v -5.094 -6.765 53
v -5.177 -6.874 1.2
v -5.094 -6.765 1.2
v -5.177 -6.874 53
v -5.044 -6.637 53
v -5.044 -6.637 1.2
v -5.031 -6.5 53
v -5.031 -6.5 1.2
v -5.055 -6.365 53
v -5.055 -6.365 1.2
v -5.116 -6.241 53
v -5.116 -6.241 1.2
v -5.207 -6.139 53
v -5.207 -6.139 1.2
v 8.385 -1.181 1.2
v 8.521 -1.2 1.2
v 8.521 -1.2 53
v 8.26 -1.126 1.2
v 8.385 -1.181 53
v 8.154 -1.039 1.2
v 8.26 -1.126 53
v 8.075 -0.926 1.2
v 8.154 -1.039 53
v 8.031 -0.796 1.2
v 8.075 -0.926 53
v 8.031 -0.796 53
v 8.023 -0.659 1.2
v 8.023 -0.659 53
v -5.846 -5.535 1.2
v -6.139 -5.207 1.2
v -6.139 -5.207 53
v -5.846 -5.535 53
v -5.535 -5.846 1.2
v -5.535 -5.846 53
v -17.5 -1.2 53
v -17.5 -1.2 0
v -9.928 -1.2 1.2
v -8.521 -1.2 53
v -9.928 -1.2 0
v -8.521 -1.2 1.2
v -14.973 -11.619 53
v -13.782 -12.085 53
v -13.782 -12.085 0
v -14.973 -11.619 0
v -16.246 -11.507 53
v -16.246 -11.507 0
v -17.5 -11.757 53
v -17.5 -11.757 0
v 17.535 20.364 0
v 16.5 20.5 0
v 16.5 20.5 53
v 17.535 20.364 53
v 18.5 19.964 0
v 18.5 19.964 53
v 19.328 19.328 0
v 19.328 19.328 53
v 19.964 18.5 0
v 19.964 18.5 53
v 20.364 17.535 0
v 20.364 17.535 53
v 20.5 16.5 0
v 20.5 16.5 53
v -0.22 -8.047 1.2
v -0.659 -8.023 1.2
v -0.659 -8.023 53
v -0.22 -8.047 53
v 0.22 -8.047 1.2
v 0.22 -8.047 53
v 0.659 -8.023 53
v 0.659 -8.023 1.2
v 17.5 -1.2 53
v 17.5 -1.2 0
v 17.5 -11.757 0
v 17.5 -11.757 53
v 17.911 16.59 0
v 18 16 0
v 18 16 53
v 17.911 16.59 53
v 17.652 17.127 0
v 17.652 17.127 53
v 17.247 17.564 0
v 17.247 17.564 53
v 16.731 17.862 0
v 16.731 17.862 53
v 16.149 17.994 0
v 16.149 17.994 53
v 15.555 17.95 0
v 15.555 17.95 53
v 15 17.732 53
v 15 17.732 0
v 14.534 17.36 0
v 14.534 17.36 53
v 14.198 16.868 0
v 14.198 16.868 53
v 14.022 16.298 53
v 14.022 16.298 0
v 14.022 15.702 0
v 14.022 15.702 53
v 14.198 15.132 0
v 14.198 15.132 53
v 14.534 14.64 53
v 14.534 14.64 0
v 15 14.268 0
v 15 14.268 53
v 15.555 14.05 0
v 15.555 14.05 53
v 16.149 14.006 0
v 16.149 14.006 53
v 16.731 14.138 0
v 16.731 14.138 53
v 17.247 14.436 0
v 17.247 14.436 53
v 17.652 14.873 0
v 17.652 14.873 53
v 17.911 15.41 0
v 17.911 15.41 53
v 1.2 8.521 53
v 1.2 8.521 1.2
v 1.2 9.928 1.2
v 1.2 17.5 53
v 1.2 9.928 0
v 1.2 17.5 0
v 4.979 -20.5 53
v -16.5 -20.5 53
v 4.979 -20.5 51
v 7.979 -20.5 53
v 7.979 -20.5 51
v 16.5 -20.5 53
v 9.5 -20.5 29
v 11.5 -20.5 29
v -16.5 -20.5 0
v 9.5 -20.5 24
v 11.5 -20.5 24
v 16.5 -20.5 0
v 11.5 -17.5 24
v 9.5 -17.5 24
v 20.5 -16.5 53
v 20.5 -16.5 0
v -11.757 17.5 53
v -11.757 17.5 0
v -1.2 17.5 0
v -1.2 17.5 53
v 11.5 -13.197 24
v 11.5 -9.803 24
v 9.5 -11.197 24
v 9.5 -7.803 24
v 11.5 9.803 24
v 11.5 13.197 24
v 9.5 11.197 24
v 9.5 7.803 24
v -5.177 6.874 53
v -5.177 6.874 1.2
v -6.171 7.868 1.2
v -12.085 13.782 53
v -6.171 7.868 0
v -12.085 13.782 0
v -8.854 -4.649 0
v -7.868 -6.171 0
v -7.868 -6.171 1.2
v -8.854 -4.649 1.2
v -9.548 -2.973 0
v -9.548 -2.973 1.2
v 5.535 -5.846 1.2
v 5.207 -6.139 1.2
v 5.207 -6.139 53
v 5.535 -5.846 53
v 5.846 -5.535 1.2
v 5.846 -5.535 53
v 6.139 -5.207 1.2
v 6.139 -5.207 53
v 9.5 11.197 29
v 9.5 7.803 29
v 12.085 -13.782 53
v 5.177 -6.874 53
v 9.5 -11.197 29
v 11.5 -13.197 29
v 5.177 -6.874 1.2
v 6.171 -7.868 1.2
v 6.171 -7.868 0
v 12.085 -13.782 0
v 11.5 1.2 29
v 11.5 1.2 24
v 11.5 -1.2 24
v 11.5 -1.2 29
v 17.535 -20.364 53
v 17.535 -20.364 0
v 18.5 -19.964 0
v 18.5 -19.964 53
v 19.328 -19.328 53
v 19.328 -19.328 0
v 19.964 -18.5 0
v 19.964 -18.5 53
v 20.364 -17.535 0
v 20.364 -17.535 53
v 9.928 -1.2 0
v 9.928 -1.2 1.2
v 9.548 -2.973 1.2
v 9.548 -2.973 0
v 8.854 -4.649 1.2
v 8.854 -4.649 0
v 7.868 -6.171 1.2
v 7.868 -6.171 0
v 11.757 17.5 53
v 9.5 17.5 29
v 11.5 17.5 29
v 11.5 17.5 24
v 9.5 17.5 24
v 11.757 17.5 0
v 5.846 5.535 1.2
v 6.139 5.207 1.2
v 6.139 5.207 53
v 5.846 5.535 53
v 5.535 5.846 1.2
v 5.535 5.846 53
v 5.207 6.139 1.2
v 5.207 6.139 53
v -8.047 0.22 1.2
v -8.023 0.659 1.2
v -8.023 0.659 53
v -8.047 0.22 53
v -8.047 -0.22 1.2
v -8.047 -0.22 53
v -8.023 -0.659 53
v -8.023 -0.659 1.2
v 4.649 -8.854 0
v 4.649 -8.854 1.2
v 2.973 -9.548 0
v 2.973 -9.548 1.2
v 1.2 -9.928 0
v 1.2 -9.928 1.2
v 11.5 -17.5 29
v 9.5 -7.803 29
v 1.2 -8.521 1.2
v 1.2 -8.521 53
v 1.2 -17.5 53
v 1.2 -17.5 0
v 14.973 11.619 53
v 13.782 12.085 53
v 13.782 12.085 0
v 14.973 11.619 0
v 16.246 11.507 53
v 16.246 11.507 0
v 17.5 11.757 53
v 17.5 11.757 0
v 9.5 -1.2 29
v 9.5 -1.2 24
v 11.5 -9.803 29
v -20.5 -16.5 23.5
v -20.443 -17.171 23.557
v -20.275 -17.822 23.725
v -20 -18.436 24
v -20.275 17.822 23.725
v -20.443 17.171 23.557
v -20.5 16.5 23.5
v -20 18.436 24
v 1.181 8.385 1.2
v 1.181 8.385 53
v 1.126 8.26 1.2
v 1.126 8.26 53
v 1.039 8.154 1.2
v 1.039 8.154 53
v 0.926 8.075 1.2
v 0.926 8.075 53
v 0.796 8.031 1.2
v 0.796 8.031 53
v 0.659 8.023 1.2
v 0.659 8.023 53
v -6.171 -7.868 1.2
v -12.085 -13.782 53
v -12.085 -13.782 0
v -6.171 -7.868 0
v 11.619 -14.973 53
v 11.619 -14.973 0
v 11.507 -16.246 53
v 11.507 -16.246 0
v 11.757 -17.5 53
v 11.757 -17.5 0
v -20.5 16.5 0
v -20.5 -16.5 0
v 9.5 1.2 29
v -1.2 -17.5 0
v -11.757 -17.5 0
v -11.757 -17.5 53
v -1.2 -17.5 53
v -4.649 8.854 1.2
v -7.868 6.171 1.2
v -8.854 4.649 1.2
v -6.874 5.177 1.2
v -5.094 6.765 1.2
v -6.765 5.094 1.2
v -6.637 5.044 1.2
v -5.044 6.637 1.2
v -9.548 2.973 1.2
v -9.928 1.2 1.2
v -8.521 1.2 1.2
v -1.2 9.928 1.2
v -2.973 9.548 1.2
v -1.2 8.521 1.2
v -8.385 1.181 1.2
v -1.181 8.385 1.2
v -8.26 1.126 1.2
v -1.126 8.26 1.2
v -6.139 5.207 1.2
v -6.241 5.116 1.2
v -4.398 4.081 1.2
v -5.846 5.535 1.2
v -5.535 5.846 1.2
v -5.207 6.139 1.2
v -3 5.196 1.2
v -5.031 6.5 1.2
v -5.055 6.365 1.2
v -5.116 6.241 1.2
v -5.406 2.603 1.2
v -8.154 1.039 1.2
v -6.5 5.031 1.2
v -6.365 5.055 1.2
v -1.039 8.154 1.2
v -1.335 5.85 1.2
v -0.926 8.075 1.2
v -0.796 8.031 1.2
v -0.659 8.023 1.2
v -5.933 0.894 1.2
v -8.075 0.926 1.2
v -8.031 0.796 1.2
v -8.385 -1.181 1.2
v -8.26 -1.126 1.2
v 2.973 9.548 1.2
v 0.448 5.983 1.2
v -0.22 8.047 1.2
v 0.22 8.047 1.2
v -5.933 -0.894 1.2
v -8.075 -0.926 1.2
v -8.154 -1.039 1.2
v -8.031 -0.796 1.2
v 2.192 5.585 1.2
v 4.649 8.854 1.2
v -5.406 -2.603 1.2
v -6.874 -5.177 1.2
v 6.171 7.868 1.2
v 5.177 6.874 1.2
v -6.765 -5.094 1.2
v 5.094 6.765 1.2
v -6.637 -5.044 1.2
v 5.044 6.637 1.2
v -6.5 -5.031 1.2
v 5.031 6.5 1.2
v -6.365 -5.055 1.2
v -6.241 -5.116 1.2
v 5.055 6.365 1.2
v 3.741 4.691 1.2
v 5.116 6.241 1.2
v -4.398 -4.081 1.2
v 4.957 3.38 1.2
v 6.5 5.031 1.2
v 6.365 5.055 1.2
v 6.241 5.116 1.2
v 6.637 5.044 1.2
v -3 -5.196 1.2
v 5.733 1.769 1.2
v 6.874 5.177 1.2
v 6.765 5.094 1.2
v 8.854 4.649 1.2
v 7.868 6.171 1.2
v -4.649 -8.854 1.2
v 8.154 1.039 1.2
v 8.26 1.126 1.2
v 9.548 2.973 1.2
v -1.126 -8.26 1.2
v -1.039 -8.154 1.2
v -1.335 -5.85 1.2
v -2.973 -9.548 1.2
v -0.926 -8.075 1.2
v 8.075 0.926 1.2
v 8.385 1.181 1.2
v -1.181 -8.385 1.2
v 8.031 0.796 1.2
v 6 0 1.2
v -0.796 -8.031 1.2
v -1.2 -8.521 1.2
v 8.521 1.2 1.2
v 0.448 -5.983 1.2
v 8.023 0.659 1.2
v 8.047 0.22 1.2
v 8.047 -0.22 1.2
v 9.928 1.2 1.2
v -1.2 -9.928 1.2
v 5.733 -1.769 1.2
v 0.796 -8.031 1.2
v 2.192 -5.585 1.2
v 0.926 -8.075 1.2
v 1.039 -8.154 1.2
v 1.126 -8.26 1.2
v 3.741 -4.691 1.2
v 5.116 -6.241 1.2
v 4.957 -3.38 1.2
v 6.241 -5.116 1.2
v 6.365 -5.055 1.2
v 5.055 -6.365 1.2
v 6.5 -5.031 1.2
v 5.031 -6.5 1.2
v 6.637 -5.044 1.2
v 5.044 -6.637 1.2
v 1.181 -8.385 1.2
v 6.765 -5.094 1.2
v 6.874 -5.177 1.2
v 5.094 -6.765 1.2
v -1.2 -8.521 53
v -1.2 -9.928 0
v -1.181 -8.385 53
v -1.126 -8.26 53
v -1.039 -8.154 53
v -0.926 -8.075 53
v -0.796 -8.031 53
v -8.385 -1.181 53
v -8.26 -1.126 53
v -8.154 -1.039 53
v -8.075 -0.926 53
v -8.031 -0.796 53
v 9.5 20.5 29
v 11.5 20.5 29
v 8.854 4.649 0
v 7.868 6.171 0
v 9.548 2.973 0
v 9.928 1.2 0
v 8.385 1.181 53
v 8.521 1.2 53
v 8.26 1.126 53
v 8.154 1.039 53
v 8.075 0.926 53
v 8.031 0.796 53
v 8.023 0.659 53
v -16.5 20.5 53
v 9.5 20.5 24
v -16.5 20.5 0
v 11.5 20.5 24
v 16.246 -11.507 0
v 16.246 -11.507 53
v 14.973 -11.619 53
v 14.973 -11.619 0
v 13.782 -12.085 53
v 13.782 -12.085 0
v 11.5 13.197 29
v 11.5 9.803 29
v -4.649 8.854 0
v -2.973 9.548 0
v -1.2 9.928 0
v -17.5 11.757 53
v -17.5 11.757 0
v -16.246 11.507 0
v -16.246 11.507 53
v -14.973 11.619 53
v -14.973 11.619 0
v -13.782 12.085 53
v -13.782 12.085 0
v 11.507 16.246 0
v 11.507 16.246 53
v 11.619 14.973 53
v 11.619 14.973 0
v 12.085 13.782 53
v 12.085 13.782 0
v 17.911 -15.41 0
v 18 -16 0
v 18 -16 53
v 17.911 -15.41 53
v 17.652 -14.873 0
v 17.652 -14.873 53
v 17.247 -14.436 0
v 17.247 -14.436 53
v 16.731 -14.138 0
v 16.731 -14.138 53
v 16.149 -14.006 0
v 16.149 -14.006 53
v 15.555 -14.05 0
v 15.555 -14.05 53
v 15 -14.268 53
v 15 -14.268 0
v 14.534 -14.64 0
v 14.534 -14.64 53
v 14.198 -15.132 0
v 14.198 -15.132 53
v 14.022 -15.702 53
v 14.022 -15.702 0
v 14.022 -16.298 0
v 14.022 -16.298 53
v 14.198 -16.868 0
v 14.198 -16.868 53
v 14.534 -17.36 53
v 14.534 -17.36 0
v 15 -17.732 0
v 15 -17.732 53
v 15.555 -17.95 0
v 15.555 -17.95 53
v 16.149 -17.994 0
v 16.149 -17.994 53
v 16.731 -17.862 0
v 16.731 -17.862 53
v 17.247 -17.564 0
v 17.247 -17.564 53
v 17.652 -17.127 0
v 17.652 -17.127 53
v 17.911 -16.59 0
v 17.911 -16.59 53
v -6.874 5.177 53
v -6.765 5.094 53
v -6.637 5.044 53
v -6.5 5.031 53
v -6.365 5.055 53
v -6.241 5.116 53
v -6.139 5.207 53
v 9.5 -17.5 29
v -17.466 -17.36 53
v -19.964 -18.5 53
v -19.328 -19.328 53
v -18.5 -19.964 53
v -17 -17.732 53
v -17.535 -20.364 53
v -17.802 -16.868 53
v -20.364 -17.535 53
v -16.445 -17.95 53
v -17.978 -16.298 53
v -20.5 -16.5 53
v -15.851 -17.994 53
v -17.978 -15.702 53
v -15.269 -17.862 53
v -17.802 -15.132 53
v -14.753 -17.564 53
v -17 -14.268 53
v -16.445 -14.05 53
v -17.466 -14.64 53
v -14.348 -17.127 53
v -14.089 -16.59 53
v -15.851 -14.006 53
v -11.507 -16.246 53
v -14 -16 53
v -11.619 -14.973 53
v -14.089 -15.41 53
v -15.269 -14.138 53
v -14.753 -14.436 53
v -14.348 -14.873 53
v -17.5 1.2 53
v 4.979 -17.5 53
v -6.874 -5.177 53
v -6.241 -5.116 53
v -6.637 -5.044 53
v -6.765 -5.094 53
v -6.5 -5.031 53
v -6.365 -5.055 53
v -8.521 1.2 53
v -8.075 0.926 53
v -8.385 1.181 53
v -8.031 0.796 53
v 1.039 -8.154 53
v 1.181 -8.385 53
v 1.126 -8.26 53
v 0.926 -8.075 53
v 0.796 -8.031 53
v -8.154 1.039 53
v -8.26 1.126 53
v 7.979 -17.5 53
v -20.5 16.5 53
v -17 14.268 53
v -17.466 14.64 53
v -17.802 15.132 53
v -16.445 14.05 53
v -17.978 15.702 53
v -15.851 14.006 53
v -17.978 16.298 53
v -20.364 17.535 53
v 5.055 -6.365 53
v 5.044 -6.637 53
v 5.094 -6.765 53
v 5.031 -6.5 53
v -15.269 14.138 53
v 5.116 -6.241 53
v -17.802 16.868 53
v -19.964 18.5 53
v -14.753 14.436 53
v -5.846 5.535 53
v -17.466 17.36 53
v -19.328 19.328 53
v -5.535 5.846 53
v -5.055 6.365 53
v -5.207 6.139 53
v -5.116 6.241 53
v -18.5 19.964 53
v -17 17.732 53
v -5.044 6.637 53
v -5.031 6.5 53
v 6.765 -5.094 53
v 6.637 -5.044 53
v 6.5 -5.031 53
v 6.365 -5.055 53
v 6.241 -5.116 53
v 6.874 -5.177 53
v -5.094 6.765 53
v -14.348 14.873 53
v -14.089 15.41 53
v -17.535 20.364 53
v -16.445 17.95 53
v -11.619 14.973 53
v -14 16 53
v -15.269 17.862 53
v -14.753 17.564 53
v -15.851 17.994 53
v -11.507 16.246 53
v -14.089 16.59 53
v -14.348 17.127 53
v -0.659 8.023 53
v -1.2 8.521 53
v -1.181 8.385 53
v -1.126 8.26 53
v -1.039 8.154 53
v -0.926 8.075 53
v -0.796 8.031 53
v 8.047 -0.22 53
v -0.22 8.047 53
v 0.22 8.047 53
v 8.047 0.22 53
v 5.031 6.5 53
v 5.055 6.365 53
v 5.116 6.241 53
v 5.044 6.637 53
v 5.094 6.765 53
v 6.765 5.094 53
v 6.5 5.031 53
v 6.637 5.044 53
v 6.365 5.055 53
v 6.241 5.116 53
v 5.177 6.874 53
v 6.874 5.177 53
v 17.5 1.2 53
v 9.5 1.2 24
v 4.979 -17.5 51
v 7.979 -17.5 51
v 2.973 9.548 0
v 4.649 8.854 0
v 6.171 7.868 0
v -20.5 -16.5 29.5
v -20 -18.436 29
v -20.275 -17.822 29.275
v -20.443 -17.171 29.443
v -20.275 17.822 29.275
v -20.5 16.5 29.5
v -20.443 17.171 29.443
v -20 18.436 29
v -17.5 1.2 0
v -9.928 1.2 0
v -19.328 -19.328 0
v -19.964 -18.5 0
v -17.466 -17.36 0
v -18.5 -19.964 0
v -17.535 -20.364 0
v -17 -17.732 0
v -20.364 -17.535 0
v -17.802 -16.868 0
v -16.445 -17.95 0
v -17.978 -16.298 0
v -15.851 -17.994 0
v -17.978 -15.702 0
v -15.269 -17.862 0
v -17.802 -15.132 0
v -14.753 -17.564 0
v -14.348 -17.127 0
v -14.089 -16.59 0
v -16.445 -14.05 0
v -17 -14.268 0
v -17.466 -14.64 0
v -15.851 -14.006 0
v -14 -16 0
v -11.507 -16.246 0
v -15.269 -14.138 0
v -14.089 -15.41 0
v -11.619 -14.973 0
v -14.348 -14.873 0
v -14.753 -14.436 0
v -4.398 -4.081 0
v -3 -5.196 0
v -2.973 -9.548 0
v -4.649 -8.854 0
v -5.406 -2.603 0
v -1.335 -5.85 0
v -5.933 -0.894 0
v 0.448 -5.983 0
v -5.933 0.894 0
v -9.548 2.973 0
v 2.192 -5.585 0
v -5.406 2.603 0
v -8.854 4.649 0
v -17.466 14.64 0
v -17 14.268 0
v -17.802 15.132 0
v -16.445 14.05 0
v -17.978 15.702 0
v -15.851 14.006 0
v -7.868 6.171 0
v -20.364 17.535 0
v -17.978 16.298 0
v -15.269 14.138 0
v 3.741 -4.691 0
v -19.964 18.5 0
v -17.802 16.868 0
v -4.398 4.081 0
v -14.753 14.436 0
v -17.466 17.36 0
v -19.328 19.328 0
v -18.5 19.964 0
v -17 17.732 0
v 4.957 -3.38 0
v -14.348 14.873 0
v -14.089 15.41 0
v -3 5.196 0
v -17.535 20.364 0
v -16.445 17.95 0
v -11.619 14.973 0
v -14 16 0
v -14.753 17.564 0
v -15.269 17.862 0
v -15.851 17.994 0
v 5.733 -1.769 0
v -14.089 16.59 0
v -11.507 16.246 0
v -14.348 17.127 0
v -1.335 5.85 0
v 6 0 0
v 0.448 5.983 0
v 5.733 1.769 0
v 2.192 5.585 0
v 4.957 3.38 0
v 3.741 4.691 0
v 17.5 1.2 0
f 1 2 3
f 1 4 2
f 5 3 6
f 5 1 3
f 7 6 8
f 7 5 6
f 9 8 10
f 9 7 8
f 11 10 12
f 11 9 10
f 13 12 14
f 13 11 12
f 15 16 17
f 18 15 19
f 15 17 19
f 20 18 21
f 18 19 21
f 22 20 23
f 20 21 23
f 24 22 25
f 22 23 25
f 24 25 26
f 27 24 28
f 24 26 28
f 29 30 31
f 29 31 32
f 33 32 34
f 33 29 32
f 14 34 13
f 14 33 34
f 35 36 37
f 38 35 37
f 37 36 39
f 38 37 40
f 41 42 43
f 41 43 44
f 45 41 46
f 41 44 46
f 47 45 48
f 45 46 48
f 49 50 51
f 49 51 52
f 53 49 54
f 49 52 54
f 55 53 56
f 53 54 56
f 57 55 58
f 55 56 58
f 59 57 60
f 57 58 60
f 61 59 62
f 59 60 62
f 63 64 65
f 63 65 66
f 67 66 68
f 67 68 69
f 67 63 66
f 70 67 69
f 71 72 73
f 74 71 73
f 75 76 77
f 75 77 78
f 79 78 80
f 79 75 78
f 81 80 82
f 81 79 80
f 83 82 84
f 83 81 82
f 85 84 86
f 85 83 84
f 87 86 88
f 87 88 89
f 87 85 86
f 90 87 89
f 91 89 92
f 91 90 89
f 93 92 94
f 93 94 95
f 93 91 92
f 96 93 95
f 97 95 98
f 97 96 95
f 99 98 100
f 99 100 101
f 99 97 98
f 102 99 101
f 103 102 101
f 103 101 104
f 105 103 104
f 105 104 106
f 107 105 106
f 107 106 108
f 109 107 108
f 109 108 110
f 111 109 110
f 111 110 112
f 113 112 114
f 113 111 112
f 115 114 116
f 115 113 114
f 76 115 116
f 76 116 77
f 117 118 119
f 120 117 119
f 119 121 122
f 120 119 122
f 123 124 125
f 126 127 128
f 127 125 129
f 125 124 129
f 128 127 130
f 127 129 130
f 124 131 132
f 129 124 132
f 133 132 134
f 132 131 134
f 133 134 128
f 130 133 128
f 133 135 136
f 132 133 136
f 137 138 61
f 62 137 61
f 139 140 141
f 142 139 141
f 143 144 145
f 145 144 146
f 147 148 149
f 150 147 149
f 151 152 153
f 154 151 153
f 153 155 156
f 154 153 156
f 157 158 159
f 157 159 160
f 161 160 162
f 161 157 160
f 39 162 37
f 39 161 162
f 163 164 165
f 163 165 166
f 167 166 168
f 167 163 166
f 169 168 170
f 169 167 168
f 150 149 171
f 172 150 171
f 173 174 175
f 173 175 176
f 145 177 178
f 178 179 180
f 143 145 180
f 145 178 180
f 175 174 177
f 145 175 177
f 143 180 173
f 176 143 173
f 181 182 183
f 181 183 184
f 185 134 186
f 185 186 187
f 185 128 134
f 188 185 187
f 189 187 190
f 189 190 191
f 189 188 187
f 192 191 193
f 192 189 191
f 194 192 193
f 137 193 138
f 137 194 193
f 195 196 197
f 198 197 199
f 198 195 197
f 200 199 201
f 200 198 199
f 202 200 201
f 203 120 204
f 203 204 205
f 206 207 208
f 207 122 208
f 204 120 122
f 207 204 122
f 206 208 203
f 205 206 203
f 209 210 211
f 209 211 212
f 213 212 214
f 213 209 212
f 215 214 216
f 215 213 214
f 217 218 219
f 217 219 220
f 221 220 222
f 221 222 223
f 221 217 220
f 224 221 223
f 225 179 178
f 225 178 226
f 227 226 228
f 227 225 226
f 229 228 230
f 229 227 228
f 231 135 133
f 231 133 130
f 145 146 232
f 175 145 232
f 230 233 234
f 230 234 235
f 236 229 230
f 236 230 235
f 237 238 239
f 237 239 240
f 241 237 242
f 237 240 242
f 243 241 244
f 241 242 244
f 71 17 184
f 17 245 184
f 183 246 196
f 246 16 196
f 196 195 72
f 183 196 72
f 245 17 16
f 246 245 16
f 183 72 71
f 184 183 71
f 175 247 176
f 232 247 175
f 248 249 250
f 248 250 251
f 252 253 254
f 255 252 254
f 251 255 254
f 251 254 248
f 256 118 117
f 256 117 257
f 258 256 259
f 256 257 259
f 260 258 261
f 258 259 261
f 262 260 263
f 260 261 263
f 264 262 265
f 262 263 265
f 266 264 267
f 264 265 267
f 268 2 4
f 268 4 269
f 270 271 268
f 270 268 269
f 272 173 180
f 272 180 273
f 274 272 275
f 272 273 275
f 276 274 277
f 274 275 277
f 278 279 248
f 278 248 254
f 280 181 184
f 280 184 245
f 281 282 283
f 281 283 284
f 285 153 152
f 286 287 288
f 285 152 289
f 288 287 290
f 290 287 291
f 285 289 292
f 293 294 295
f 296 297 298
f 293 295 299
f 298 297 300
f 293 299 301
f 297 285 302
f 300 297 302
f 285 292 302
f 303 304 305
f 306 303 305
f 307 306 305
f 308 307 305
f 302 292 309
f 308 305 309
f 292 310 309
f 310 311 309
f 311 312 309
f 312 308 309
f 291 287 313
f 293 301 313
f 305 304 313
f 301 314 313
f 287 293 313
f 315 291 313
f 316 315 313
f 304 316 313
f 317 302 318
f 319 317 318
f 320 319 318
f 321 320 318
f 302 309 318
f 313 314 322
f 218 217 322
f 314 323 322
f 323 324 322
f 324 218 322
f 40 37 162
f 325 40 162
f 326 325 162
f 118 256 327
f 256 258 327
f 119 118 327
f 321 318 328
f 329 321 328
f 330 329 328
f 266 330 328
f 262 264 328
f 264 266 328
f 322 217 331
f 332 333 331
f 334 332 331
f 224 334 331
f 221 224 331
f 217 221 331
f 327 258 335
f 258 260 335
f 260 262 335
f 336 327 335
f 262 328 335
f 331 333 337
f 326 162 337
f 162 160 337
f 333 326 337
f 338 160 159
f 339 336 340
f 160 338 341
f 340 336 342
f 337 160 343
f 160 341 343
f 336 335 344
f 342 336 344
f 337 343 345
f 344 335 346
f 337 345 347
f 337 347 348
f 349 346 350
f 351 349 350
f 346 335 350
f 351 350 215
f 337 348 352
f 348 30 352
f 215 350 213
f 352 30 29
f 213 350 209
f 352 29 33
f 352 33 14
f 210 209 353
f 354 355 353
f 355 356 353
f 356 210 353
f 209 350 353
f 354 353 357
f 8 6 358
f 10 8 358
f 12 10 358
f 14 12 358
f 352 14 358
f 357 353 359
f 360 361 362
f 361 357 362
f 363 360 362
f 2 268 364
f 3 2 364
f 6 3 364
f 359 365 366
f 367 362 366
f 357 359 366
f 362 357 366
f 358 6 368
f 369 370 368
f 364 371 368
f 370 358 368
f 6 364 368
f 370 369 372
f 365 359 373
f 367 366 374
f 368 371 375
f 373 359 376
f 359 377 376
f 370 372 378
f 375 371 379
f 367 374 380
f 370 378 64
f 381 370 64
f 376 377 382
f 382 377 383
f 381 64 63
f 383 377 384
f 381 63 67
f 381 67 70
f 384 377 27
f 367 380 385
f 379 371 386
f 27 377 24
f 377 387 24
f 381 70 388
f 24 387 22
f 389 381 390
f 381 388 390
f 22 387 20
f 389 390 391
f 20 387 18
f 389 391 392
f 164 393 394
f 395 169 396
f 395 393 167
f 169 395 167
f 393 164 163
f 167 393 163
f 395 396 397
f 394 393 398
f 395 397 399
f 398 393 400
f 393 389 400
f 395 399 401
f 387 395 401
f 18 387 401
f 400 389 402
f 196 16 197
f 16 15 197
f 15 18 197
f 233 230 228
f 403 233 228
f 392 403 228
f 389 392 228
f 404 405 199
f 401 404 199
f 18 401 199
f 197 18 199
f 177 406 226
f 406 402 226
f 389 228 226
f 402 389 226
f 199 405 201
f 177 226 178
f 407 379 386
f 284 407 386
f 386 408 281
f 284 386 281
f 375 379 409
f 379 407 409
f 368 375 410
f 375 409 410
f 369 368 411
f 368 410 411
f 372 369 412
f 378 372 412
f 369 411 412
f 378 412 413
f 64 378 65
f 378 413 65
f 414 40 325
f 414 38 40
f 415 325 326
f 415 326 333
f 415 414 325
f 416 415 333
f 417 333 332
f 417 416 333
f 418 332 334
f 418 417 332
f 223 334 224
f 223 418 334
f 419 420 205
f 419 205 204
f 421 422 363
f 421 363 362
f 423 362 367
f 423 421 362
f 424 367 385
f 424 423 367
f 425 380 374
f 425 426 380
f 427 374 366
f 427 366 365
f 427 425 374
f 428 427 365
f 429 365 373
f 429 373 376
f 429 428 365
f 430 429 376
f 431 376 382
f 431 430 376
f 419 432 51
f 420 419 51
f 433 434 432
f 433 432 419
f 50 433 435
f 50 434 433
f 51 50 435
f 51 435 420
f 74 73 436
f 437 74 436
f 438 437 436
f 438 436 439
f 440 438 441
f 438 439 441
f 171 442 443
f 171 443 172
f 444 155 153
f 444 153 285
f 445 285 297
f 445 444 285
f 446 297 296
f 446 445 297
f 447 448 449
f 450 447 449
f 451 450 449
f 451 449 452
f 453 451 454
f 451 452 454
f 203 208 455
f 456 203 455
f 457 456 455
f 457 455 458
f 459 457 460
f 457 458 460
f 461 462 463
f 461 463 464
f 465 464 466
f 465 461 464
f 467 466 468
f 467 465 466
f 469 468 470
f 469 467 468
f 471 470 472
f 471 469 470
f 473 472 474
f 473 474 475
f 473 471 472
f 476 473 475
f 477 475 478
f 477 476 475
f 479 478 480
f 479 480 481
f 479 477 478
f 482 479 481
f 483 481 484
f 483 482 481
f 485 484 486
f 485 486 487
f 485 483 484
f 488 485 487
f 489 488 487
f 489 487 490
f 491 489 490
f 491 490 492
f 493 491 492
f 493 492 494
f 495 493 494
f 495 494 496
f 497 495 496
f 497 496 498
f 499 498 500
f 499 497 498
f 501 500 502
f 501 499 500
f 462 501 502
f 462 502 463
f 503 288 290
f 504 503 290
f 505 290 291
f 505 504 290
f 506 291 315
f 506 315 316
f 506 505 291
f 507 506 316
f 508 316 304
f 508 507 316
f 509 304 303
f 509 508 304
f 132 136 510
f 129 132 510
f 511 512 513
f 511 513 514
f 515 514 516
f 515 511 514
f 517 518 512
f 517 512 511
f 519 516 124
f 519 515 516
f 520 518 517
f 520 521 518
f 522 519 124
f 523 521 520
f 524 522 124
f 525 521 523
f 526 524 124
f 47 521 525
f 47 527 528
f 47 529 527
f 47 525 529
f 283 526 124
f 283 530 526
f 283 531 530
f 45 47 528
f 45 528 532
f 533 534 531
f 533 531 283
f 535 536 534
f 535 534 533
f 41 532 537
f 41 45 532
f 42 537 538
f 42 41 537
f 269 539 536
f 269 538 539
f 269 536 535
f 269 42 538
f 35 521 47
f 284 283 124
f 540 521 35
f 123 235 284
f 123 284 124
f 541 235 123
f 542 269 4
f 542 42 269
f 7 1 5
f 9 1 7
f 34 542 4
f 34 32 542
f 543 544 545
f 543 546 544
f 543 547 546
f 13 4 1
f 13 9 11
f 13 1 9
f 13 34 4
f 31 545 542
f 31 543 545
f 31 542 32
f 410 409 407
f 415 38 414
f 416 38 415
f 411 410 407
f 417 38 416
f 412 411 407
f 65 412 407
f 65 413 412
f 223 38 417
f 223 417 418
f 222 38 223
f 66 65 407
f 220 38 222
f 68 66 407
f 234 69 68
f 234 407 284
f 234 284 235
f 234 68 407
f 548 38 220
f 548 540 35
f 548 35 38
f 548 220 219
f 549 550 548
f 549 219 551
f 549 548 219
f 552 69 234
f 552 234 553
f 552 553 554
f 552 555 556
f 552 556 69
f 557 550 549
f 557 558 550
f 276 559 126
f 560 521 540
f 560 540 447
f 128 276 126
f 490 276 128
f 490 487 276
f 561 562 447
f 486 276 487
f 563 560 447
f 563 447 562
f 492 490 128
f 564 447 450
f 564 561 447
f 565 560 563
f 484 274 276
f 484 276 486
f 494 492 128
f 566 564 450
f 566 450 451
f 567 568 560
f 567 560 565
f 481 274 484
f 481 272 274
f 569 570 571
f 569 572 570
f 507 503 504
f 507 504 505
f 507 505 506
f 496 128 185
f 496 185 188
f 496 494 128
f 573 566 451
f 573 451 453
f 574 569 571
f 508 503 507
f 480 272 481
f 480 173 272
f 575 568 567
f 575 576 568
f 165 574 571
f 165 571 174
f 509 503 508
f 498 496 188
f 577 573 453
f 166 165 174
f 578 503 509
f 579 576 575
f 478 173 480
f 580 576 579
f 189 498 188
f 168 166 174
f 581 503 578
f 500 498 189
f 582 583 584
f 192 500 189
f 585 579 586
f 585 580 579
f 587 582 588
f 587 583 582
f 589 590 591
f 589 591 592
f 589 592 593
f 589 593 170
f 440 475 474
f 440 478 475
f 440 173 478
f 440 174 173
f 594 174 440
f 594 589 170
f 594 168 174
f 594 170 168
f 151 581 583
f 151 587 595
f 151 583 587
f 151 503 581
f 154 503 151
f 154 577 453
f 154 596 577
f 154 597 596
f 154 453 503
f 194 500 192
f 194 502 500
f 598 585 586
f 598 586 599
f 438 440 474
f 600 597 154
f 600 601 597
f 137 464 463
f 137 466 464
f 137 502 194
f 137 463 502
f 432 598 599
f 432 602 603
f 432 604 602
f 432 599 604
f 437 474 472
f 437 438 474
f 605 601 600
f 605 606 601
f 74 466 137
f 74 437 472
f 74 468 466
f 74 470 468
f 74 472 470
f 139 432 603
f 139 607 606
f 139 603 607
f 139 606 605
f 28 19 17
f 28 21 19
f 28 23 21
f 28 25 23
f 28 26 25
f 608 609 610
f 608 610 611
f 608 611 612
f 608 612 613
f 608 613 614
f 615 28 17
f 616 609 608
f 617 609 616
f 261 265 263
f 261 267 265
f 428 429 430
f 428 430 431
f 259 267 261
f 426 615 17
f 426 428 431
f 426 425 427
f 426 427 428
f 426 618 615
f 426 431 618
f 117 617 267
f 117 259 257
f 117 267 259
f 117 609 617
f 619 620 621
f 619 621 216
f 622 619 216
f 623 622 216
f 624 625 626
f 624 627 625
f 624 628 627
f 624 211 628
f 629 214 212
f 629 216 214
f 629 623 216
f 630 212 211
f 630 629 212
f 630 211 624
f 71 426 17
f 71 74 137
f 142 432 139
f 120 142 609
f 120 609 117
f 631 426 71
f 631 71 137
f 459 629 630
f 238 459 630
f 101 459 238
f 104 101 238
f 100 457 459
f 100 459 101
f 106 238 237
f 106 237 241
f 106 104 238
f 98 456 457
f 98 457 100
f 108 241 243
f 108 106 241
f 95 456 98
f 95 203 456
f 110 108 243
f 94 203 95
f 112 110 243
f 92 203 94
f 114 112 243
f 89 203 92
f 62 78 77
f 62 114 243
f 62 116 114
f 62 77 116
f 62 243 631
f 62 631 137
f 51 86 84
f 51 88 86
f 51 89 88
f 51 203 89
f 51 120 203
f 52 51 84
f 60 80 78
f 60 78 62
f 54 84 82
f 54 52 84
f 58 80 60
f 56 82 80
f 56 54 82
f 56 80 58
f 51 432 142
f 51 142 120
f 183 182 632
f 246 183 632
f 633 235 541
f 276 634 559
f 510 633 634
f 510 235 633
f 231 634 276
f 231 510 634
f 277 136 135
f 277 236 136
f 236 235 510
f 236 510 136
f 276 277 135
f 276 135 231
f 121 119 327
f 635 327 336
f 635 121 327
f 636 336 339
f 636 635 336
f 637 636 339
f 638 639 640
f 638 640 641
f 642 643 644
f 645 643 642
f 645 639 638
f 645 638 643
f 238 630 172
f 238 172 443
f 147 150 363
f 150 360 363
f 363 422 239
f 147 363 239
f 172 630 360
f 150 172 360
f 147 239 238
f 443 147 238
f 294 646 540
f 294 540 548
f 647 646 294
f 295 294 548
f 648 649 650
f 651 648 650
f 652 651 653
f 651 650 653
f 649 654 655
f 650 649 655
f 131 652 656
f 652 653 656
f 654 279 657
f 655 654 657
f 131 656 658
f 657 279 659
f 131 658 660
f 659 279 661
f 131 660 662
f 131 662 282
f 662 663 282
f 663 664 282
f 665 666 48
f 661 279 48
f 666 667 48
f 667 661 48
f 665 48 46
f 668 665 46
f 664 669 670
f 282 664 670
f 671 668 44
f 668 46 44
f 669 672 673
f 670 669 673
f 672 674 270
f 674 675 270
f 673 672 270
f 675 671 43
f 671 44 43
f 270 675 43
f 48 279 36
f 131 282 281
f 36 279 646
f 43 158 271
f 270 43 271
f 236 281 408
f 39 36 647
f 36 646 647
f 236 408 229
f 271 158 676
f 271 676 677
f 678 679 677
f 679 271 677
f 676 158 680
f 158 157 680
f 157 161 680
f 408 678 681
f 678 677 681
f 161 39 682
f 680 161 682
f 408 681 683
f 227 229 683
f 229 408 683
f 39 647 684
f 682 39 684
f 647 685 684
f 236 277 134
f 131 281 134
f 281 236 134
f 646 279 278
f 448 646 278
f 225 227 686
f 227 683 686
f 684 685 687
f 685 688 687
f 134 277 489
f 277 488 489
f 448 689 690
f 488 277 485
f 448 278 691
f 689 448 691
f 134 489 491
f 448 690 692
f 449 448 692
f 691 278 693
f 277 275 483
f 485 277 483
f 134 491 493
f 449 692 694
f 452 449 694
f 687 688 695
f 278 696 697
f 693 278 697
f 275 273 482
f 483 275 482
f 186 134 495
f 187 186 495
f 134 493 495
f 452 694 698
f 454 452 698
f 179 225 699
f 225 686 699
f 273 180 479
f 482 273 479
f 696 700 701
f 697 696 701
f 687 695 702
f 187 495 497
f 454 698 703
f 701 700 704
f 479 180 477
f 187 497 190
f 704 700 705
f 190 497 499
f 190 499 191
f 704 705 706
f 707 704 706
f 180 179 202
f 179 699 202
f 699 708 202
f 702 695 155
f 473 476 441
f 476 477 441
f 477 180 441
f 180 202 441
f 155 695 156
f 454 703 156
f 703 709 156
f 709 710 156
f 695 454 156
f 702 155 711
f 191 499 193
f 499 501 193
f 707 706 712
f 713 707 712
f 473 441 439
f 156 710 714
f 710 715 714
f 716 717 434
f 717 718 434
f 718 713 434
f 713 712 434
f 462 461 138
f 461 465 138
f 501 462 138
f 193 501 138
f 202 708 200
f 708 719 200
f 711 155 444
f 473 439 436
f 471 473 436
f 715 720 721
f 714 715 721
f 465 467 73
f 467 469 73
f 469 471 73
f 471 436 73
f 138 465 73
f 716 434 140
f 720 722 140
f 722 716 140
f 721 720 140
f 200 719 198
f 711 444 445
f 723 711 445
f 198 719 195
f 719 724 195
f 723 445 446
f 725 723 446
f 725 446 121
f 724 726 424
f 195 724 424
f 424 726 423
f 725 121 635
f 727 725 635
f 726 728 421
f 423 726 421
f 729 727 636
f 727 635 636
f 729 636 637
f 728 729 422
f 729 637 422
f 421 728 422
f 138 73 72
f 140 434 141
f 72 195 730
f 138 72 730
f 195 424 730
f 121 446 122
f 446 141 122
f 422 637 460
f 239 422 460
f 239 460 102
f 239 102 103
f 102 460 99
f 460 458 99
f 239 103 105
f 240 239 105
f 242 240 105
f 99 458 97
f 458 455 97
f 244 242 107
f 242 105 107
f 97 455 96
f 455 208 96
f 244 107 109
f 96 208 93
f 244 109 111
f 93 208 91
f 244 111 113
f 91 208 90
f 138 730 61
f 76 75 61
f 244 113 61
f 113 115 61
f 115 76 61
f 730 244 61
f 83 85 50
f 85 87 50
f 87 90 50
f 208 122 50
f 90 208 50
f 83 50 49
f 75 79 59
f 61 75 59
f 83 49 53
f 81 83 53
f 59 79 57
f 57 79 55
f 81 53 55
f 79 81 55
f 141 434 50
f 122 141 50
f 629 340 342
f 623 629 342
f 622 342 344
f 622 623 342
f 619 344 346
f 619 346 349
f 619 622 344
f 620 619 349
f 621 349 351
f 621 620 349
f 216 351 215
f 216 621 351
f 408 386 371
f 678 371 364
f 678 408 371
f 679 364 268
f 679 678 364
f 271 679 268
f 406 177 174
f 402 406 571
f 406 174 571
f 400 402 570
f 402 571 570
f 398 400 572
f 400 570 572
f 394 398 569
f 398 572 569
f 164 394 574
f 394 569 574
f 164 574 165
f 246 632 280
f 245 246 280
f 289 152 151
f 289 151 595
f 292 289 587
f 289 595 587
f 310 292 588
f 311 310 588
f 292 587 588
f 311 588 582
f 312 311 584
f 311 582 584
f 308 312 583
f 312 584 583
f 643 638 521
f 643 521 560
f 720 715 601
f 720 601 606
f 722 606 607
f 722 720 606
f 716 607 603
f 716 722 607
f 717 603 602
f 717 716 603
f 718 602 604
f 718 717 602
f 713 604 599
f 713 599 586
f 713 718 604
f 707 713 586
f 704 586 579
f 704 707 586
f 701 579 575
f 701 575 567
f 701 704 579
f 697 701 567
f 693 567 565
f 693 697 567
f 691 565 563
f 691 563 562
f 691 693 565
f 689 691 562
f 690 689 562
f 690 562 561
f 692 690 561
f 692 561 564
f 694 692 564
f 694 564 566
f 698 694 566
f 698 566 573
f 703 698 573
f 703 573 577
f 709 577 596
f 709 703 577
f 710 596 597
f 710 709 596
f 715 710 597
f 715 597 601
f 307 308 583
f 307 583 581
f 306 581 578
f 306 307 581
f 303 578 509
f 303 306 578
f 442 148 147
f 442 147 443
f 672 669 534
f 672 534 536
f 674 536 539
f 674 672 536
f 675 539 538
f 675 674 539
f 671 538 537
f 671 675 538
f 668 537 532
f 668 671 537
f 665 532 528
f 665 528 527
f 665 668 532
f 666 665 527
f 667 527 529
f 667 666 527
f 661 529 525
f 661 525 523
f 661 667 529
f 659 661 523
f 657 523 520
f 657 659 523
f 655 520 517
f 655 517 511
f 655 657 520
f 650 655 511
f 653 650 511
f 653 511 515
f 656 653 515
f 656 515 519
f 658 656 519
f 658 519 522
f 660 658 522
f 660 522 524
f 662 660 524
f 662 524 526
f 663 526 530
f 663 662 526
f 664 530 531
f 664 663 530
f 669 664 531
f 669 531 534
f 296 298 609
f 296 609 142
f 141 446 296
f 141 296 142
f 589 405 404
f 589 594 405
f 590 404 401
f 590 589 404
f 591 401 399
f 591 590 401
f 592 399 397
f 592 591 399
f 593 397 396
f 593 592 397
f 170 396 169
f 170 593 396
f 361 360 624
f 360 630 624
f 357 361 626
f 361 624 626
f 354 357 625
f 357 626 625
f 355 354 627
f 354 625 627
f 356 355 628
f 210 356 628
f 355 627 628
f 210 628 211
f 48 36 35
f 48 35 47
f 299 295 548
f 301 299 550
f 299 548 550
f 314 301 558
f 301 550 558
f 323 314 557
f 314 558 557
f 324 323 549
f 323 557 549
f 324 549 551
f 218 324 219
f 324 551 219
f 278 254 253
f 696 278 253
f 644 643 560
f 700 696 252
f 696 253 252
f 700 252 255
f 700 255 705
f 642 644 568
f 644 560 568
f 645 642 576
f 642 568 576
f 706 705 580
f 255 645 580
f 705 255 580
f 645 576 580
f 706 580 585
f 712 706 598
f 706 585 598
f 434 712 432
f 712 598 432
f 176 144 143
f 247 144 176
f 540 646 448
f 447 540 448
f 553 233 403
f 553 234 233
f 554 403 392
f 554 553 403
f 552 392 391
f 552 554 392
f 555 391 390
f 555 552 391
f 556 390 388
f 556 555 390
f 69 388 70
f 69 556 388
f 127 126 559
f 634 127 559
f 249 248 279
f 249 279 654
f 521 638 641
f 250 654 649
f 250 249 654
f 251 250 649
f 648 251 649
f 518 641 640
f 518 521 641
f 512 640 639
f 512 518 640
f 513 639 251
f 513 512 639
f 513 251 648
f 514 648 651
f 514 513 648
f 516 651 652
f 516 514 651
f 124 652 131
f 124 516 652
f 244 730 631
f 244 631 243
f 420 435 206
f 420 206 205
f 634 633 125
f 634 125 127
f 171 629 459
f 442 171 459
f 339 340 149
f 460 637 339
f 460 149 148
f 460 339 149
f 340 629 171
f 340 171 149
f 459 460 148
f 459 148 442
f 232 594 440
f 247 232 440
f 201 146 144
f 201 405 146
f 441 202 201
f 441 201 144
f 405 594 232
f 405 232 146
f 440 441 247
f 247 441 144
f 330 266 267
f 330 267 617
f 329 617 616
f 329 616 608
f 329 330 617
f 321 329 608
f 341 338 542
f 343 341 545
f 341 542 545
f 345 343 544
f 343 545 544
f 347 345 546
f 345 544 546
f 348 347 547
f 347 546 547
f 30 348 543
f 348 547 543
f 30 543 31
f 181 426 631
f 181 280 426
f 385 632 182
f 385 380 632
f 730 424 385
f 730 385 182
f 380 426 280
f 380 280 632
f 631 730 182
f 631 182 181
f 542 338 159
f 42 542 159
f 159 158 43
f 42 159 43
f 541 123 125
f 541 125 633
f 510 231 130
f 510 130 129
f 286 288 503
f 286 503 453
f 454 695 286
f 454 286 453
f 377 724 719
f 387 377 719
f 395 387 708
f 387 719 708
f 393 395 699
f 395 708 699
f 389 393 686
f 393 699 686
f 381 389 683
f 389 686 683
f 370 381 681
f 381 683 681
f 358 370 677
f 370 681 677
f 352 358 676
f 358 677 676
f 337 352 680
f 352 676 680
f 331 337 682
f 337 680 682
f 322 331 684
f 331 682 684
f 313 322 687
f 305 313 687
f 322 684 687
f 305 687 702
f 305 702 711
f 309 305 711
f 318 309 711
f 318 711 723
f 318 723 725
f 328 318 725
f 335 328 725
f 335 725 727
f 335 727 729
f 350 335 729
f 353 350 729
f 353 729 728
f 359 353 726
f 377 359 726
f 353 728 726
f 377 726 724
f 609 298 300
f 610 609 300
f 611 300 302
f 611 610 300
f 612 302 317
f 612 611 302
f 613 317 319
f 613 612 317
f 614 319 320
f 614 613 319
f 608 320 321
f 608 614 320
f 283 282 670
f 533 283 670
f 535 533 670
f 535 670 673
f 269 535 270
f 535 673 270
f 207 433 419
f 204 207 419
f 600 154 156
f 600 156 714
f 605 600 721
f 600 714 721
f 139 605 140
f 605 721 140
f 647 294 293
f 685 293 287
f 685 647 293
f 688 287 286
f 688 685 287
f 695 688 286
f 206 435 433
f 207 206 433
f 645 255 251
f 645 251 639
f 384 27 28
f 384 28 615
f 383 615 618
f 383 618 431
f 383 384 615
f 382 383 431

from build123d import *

# Parameters (mm, degrees)
SKETCH_W        = 41
SKETCH_H        = 41
SKETCH_R        = 2
PAD_DEPTH       = 53
SKETCH001_R     = 10
SKETCH001_R_2   = 6
PAD001_DEPTH    = 1.2
FILLET_R        = 0.5
FILLET001_R     = 4
SKETCH002_W     = 3
SKETCH002_H     = 3
POCKET_DEPTH    = 2
SKETCH003_W     = 2
SKETCH003_H     = 5
POCKET001_DEPTH = 41.001
POCKET002_DEPTH = 41.001


with BuildPart() as part:
    # Sketch → Pad (new body)
    with BuildSketch(Plane.XY):
        Rectangle(SKETCH_W, SKETCH_H)
        with Locations((-16, 16)):
            Circle(SKETCH_R, mode=Mode.SUBTRACT)
        with Locations((16, 16)):
            Circle(SKETCH_R, mode=Mode.SUBTRACT)
        with Locations((-16, -16)):
            Circle(SKETCH_R, mode=Mode.SUBTRACT)
        with Locations((16, -16)):
            Circle(SKETCH_R, mode=Mode.SUBTRACT)
        with BuildLine():
            Line((-17.5, 1.2), (-7.960057, 1.2))
            ThreePointArc((-7.960057, 1.2), (-8.05, 0), (-7.960057, -1.2))
            Line((-17.5, -1.2), (-7.960057, -1.2))
            Line((-17.5, -1.2), (-17.5, -11.757359))
            ThreePointArc((-13.781771, -12.084715), (-15.605344, -11.517339), (-17.5, -11.757359))
            Line((-6.477138, -4.780082), (-13.781771, -12.084715))
            ThreePointArc((-6.477138, -4.780082), (-5.69221, -5.69221), (-4.780082, -6.477138))
            Line((-4.780082, -6.477138), (-12.084715, -13.781771))
            ThreePointArc((-11.757359, -17.5), (-11.517339, -15.605344), (-12.084715, -13.781771))
            Line((-11.757359, -17.5), (-1.2, -17.5))
            Line((-1.2, -7.960057), (-1.2, -17.5))
            ThreePointArc((-1.2, -7.960057), (0, -8.05), (1.2, -7.960057))
            Line((1.2, -7.960057), (1.2, -17.5))
            Line((1.2, -17.5), (11.757359, -17.5))
            ThreePointArc((12.084715, -13.781771), (11.517339, -15.605344), (11.757359, -17.5))
            Line((4.780082, -6.477138), (12.084715, -13.781771))
            ThreePointArc((4.780082, -6.477138), (5.69221, -5.69221), (6.477138, -4.780082))
            Line((6.477138, -4.780082), (13.781771, -12.084715))
            ThreePointArc((17.5, -11.757359), (15.605344, -11.517339), (13.781771, -12.084715))
            Line((17.5, -1.2), (17.5, -11.757359))
            Line((7.960057, -1.2), (17.5, -1.2))
            ThreePointArc((7.960057, -1.2), (8.05, 0), (7.960057, 1.2))
            Line((7.960057, 1.2), (17.5, 1.2))
            Line((17.5, 1.2), (17.5, 11.757359))
            ThreePointArc((13.781771, 12.084715), (15.605344, 11.517339), (17.5, 11.757359))
            Line((6.477138, 4.780082), (13.781771, 12.084715))
            ThreePointArc((6.477138, 4.780082), (5.69221, 5.69221), (4.780082, 6.477138))
            Line((4.780082, 6.477138), (12.084715, 13.781771))
            ThreePointArc((11.757359, 17.5), (11.517339, 15.605344), (12.084715, 13.781771))
            Line((1.2, 17.5), (11.757359, 17.5))
            Line((1.2, 7.960057), (1.2, 17.5))
            ThreePointArc((1.2, 7.960057), (0, 8.05), (-1.2, 7.960057))
            Line((-1.2, 7.960057), (-1.2, 17.5))
            Line((-11.757359, 17.5), (-1.2, 17.5))
            ThreePointArc((-12.084715, 13.781771), (-11.517339, 15.605344), (-11.757359, 17.5))
            Line((-4.780082, 6.477138), (-12.084715, 13.781771))
            ThreePointArc((-4.780082, 6.477138), (-5.69221, 5.69221), (-6.477138, 4.780082))
            Line((-6.477138, 4.780082), (-13.781771, 12.084715))
            ThreePointArc((-17.5, 11.757359), (-15.605344, 11.517339), (-13.781771, 12.084715))
            Line((-17.5, 1.2), (-17.5, 11.757359))
        make_face(mode=Mode.SUBTRACT)
    extrude(amount=PAD_DEPTH)

    # Sketch001 → Pad001 (new body)
    with BuildSketch(Plane(origin=(0, 0, 0), x_dir=(1, 0, 0), z_dir=(0, 0, -1))):
        Circle(SKETCH001_R)
        Circle(SKETCH001_R_2, mode=Mode.SUBTRACT)
    extrude(amount=-PAD001_DEPTH)

    # Fillet
    fillet_edges = [part.edges().sort_by_distance(p)[0] for p in [
        (-6.477138, 4.780082, 27.1),
        (-4.780082, 6.477138, 27.1),
        (-1.2, 7.960057, 27.1),
        (1.2, 7.960057, 27.1),
        (4.780082, 6.477138, 27.1),
        (6.477138, 4.780082, 27.1),
        (-7.960057, 1.2, 27.1),
        (-7.960057, -1.2, 27.1),
        (-6.477138, -4.780082, 27.1),
        (-4.780082, -6.477138, 27.1),
        (-1.2, -7.960057, 27.1),
        (1.2, -7.960057, 27.1),
        (4.780082, -6.477138, 27.1),
        (6.477138, -4.780082, 27.1),
        (7.960057, -1.2, 27.1),
        (7.960057, 1.2, 27.1),
    ]]
    fillet(fillet_edges, radius=FILLET_R)

    # Fillet001
    fillet001_edges = [part.edges().sort_by_distance(p)[0] for p in [
        (-20.5, 20.5, 26.5),
        (20.5, 20.5, 26.5),
        (-20.5, -20.5, 26.5),
        (20.5, -20.5, 26.5),
    ]]
    fillet(fillet001_edges, radius=FILLET001_R)

    # Sketch002 → Pocket (cut)
    with BuildSketch(Plane.XY.offset(53)):
        with Locations((6.47868, -19)):
            Rectangle(SKETCH002_W, SKETCH002_H)
    extrude(amount=-POCKET_DEPTH, mode=Mode.SUBTRACT)

    # Sketch003 → Pocket001 (cut, through all)
    with BuildSketch(Plane(origin=(0, 20.5, 0), x_dir=(-1, 0, 0), z_dir=(0, 1, 0))):
        with Locations((-10.5, 26.5)):
            Rectangle(SKETCH003_W, SKETCH003_H)
    extrude(amount=-POCKET001_DEPTH, mode=Mode.SUBTRACT)

    # Sketch004 → Pocket002 (cut, through all)
    with BuildSketch(Plane(origin=(0, 20.5, 0), x_dir=(-1, 0, 0), z_dir=(0, 1, 0))):
        Polygon((20, 29), (22, 31), (22, 22), (20, 24), align=None)
    extrude(amount=-POCKET002_DEPTH, mode=Mode.SUBTRACT)


solid = part.part
